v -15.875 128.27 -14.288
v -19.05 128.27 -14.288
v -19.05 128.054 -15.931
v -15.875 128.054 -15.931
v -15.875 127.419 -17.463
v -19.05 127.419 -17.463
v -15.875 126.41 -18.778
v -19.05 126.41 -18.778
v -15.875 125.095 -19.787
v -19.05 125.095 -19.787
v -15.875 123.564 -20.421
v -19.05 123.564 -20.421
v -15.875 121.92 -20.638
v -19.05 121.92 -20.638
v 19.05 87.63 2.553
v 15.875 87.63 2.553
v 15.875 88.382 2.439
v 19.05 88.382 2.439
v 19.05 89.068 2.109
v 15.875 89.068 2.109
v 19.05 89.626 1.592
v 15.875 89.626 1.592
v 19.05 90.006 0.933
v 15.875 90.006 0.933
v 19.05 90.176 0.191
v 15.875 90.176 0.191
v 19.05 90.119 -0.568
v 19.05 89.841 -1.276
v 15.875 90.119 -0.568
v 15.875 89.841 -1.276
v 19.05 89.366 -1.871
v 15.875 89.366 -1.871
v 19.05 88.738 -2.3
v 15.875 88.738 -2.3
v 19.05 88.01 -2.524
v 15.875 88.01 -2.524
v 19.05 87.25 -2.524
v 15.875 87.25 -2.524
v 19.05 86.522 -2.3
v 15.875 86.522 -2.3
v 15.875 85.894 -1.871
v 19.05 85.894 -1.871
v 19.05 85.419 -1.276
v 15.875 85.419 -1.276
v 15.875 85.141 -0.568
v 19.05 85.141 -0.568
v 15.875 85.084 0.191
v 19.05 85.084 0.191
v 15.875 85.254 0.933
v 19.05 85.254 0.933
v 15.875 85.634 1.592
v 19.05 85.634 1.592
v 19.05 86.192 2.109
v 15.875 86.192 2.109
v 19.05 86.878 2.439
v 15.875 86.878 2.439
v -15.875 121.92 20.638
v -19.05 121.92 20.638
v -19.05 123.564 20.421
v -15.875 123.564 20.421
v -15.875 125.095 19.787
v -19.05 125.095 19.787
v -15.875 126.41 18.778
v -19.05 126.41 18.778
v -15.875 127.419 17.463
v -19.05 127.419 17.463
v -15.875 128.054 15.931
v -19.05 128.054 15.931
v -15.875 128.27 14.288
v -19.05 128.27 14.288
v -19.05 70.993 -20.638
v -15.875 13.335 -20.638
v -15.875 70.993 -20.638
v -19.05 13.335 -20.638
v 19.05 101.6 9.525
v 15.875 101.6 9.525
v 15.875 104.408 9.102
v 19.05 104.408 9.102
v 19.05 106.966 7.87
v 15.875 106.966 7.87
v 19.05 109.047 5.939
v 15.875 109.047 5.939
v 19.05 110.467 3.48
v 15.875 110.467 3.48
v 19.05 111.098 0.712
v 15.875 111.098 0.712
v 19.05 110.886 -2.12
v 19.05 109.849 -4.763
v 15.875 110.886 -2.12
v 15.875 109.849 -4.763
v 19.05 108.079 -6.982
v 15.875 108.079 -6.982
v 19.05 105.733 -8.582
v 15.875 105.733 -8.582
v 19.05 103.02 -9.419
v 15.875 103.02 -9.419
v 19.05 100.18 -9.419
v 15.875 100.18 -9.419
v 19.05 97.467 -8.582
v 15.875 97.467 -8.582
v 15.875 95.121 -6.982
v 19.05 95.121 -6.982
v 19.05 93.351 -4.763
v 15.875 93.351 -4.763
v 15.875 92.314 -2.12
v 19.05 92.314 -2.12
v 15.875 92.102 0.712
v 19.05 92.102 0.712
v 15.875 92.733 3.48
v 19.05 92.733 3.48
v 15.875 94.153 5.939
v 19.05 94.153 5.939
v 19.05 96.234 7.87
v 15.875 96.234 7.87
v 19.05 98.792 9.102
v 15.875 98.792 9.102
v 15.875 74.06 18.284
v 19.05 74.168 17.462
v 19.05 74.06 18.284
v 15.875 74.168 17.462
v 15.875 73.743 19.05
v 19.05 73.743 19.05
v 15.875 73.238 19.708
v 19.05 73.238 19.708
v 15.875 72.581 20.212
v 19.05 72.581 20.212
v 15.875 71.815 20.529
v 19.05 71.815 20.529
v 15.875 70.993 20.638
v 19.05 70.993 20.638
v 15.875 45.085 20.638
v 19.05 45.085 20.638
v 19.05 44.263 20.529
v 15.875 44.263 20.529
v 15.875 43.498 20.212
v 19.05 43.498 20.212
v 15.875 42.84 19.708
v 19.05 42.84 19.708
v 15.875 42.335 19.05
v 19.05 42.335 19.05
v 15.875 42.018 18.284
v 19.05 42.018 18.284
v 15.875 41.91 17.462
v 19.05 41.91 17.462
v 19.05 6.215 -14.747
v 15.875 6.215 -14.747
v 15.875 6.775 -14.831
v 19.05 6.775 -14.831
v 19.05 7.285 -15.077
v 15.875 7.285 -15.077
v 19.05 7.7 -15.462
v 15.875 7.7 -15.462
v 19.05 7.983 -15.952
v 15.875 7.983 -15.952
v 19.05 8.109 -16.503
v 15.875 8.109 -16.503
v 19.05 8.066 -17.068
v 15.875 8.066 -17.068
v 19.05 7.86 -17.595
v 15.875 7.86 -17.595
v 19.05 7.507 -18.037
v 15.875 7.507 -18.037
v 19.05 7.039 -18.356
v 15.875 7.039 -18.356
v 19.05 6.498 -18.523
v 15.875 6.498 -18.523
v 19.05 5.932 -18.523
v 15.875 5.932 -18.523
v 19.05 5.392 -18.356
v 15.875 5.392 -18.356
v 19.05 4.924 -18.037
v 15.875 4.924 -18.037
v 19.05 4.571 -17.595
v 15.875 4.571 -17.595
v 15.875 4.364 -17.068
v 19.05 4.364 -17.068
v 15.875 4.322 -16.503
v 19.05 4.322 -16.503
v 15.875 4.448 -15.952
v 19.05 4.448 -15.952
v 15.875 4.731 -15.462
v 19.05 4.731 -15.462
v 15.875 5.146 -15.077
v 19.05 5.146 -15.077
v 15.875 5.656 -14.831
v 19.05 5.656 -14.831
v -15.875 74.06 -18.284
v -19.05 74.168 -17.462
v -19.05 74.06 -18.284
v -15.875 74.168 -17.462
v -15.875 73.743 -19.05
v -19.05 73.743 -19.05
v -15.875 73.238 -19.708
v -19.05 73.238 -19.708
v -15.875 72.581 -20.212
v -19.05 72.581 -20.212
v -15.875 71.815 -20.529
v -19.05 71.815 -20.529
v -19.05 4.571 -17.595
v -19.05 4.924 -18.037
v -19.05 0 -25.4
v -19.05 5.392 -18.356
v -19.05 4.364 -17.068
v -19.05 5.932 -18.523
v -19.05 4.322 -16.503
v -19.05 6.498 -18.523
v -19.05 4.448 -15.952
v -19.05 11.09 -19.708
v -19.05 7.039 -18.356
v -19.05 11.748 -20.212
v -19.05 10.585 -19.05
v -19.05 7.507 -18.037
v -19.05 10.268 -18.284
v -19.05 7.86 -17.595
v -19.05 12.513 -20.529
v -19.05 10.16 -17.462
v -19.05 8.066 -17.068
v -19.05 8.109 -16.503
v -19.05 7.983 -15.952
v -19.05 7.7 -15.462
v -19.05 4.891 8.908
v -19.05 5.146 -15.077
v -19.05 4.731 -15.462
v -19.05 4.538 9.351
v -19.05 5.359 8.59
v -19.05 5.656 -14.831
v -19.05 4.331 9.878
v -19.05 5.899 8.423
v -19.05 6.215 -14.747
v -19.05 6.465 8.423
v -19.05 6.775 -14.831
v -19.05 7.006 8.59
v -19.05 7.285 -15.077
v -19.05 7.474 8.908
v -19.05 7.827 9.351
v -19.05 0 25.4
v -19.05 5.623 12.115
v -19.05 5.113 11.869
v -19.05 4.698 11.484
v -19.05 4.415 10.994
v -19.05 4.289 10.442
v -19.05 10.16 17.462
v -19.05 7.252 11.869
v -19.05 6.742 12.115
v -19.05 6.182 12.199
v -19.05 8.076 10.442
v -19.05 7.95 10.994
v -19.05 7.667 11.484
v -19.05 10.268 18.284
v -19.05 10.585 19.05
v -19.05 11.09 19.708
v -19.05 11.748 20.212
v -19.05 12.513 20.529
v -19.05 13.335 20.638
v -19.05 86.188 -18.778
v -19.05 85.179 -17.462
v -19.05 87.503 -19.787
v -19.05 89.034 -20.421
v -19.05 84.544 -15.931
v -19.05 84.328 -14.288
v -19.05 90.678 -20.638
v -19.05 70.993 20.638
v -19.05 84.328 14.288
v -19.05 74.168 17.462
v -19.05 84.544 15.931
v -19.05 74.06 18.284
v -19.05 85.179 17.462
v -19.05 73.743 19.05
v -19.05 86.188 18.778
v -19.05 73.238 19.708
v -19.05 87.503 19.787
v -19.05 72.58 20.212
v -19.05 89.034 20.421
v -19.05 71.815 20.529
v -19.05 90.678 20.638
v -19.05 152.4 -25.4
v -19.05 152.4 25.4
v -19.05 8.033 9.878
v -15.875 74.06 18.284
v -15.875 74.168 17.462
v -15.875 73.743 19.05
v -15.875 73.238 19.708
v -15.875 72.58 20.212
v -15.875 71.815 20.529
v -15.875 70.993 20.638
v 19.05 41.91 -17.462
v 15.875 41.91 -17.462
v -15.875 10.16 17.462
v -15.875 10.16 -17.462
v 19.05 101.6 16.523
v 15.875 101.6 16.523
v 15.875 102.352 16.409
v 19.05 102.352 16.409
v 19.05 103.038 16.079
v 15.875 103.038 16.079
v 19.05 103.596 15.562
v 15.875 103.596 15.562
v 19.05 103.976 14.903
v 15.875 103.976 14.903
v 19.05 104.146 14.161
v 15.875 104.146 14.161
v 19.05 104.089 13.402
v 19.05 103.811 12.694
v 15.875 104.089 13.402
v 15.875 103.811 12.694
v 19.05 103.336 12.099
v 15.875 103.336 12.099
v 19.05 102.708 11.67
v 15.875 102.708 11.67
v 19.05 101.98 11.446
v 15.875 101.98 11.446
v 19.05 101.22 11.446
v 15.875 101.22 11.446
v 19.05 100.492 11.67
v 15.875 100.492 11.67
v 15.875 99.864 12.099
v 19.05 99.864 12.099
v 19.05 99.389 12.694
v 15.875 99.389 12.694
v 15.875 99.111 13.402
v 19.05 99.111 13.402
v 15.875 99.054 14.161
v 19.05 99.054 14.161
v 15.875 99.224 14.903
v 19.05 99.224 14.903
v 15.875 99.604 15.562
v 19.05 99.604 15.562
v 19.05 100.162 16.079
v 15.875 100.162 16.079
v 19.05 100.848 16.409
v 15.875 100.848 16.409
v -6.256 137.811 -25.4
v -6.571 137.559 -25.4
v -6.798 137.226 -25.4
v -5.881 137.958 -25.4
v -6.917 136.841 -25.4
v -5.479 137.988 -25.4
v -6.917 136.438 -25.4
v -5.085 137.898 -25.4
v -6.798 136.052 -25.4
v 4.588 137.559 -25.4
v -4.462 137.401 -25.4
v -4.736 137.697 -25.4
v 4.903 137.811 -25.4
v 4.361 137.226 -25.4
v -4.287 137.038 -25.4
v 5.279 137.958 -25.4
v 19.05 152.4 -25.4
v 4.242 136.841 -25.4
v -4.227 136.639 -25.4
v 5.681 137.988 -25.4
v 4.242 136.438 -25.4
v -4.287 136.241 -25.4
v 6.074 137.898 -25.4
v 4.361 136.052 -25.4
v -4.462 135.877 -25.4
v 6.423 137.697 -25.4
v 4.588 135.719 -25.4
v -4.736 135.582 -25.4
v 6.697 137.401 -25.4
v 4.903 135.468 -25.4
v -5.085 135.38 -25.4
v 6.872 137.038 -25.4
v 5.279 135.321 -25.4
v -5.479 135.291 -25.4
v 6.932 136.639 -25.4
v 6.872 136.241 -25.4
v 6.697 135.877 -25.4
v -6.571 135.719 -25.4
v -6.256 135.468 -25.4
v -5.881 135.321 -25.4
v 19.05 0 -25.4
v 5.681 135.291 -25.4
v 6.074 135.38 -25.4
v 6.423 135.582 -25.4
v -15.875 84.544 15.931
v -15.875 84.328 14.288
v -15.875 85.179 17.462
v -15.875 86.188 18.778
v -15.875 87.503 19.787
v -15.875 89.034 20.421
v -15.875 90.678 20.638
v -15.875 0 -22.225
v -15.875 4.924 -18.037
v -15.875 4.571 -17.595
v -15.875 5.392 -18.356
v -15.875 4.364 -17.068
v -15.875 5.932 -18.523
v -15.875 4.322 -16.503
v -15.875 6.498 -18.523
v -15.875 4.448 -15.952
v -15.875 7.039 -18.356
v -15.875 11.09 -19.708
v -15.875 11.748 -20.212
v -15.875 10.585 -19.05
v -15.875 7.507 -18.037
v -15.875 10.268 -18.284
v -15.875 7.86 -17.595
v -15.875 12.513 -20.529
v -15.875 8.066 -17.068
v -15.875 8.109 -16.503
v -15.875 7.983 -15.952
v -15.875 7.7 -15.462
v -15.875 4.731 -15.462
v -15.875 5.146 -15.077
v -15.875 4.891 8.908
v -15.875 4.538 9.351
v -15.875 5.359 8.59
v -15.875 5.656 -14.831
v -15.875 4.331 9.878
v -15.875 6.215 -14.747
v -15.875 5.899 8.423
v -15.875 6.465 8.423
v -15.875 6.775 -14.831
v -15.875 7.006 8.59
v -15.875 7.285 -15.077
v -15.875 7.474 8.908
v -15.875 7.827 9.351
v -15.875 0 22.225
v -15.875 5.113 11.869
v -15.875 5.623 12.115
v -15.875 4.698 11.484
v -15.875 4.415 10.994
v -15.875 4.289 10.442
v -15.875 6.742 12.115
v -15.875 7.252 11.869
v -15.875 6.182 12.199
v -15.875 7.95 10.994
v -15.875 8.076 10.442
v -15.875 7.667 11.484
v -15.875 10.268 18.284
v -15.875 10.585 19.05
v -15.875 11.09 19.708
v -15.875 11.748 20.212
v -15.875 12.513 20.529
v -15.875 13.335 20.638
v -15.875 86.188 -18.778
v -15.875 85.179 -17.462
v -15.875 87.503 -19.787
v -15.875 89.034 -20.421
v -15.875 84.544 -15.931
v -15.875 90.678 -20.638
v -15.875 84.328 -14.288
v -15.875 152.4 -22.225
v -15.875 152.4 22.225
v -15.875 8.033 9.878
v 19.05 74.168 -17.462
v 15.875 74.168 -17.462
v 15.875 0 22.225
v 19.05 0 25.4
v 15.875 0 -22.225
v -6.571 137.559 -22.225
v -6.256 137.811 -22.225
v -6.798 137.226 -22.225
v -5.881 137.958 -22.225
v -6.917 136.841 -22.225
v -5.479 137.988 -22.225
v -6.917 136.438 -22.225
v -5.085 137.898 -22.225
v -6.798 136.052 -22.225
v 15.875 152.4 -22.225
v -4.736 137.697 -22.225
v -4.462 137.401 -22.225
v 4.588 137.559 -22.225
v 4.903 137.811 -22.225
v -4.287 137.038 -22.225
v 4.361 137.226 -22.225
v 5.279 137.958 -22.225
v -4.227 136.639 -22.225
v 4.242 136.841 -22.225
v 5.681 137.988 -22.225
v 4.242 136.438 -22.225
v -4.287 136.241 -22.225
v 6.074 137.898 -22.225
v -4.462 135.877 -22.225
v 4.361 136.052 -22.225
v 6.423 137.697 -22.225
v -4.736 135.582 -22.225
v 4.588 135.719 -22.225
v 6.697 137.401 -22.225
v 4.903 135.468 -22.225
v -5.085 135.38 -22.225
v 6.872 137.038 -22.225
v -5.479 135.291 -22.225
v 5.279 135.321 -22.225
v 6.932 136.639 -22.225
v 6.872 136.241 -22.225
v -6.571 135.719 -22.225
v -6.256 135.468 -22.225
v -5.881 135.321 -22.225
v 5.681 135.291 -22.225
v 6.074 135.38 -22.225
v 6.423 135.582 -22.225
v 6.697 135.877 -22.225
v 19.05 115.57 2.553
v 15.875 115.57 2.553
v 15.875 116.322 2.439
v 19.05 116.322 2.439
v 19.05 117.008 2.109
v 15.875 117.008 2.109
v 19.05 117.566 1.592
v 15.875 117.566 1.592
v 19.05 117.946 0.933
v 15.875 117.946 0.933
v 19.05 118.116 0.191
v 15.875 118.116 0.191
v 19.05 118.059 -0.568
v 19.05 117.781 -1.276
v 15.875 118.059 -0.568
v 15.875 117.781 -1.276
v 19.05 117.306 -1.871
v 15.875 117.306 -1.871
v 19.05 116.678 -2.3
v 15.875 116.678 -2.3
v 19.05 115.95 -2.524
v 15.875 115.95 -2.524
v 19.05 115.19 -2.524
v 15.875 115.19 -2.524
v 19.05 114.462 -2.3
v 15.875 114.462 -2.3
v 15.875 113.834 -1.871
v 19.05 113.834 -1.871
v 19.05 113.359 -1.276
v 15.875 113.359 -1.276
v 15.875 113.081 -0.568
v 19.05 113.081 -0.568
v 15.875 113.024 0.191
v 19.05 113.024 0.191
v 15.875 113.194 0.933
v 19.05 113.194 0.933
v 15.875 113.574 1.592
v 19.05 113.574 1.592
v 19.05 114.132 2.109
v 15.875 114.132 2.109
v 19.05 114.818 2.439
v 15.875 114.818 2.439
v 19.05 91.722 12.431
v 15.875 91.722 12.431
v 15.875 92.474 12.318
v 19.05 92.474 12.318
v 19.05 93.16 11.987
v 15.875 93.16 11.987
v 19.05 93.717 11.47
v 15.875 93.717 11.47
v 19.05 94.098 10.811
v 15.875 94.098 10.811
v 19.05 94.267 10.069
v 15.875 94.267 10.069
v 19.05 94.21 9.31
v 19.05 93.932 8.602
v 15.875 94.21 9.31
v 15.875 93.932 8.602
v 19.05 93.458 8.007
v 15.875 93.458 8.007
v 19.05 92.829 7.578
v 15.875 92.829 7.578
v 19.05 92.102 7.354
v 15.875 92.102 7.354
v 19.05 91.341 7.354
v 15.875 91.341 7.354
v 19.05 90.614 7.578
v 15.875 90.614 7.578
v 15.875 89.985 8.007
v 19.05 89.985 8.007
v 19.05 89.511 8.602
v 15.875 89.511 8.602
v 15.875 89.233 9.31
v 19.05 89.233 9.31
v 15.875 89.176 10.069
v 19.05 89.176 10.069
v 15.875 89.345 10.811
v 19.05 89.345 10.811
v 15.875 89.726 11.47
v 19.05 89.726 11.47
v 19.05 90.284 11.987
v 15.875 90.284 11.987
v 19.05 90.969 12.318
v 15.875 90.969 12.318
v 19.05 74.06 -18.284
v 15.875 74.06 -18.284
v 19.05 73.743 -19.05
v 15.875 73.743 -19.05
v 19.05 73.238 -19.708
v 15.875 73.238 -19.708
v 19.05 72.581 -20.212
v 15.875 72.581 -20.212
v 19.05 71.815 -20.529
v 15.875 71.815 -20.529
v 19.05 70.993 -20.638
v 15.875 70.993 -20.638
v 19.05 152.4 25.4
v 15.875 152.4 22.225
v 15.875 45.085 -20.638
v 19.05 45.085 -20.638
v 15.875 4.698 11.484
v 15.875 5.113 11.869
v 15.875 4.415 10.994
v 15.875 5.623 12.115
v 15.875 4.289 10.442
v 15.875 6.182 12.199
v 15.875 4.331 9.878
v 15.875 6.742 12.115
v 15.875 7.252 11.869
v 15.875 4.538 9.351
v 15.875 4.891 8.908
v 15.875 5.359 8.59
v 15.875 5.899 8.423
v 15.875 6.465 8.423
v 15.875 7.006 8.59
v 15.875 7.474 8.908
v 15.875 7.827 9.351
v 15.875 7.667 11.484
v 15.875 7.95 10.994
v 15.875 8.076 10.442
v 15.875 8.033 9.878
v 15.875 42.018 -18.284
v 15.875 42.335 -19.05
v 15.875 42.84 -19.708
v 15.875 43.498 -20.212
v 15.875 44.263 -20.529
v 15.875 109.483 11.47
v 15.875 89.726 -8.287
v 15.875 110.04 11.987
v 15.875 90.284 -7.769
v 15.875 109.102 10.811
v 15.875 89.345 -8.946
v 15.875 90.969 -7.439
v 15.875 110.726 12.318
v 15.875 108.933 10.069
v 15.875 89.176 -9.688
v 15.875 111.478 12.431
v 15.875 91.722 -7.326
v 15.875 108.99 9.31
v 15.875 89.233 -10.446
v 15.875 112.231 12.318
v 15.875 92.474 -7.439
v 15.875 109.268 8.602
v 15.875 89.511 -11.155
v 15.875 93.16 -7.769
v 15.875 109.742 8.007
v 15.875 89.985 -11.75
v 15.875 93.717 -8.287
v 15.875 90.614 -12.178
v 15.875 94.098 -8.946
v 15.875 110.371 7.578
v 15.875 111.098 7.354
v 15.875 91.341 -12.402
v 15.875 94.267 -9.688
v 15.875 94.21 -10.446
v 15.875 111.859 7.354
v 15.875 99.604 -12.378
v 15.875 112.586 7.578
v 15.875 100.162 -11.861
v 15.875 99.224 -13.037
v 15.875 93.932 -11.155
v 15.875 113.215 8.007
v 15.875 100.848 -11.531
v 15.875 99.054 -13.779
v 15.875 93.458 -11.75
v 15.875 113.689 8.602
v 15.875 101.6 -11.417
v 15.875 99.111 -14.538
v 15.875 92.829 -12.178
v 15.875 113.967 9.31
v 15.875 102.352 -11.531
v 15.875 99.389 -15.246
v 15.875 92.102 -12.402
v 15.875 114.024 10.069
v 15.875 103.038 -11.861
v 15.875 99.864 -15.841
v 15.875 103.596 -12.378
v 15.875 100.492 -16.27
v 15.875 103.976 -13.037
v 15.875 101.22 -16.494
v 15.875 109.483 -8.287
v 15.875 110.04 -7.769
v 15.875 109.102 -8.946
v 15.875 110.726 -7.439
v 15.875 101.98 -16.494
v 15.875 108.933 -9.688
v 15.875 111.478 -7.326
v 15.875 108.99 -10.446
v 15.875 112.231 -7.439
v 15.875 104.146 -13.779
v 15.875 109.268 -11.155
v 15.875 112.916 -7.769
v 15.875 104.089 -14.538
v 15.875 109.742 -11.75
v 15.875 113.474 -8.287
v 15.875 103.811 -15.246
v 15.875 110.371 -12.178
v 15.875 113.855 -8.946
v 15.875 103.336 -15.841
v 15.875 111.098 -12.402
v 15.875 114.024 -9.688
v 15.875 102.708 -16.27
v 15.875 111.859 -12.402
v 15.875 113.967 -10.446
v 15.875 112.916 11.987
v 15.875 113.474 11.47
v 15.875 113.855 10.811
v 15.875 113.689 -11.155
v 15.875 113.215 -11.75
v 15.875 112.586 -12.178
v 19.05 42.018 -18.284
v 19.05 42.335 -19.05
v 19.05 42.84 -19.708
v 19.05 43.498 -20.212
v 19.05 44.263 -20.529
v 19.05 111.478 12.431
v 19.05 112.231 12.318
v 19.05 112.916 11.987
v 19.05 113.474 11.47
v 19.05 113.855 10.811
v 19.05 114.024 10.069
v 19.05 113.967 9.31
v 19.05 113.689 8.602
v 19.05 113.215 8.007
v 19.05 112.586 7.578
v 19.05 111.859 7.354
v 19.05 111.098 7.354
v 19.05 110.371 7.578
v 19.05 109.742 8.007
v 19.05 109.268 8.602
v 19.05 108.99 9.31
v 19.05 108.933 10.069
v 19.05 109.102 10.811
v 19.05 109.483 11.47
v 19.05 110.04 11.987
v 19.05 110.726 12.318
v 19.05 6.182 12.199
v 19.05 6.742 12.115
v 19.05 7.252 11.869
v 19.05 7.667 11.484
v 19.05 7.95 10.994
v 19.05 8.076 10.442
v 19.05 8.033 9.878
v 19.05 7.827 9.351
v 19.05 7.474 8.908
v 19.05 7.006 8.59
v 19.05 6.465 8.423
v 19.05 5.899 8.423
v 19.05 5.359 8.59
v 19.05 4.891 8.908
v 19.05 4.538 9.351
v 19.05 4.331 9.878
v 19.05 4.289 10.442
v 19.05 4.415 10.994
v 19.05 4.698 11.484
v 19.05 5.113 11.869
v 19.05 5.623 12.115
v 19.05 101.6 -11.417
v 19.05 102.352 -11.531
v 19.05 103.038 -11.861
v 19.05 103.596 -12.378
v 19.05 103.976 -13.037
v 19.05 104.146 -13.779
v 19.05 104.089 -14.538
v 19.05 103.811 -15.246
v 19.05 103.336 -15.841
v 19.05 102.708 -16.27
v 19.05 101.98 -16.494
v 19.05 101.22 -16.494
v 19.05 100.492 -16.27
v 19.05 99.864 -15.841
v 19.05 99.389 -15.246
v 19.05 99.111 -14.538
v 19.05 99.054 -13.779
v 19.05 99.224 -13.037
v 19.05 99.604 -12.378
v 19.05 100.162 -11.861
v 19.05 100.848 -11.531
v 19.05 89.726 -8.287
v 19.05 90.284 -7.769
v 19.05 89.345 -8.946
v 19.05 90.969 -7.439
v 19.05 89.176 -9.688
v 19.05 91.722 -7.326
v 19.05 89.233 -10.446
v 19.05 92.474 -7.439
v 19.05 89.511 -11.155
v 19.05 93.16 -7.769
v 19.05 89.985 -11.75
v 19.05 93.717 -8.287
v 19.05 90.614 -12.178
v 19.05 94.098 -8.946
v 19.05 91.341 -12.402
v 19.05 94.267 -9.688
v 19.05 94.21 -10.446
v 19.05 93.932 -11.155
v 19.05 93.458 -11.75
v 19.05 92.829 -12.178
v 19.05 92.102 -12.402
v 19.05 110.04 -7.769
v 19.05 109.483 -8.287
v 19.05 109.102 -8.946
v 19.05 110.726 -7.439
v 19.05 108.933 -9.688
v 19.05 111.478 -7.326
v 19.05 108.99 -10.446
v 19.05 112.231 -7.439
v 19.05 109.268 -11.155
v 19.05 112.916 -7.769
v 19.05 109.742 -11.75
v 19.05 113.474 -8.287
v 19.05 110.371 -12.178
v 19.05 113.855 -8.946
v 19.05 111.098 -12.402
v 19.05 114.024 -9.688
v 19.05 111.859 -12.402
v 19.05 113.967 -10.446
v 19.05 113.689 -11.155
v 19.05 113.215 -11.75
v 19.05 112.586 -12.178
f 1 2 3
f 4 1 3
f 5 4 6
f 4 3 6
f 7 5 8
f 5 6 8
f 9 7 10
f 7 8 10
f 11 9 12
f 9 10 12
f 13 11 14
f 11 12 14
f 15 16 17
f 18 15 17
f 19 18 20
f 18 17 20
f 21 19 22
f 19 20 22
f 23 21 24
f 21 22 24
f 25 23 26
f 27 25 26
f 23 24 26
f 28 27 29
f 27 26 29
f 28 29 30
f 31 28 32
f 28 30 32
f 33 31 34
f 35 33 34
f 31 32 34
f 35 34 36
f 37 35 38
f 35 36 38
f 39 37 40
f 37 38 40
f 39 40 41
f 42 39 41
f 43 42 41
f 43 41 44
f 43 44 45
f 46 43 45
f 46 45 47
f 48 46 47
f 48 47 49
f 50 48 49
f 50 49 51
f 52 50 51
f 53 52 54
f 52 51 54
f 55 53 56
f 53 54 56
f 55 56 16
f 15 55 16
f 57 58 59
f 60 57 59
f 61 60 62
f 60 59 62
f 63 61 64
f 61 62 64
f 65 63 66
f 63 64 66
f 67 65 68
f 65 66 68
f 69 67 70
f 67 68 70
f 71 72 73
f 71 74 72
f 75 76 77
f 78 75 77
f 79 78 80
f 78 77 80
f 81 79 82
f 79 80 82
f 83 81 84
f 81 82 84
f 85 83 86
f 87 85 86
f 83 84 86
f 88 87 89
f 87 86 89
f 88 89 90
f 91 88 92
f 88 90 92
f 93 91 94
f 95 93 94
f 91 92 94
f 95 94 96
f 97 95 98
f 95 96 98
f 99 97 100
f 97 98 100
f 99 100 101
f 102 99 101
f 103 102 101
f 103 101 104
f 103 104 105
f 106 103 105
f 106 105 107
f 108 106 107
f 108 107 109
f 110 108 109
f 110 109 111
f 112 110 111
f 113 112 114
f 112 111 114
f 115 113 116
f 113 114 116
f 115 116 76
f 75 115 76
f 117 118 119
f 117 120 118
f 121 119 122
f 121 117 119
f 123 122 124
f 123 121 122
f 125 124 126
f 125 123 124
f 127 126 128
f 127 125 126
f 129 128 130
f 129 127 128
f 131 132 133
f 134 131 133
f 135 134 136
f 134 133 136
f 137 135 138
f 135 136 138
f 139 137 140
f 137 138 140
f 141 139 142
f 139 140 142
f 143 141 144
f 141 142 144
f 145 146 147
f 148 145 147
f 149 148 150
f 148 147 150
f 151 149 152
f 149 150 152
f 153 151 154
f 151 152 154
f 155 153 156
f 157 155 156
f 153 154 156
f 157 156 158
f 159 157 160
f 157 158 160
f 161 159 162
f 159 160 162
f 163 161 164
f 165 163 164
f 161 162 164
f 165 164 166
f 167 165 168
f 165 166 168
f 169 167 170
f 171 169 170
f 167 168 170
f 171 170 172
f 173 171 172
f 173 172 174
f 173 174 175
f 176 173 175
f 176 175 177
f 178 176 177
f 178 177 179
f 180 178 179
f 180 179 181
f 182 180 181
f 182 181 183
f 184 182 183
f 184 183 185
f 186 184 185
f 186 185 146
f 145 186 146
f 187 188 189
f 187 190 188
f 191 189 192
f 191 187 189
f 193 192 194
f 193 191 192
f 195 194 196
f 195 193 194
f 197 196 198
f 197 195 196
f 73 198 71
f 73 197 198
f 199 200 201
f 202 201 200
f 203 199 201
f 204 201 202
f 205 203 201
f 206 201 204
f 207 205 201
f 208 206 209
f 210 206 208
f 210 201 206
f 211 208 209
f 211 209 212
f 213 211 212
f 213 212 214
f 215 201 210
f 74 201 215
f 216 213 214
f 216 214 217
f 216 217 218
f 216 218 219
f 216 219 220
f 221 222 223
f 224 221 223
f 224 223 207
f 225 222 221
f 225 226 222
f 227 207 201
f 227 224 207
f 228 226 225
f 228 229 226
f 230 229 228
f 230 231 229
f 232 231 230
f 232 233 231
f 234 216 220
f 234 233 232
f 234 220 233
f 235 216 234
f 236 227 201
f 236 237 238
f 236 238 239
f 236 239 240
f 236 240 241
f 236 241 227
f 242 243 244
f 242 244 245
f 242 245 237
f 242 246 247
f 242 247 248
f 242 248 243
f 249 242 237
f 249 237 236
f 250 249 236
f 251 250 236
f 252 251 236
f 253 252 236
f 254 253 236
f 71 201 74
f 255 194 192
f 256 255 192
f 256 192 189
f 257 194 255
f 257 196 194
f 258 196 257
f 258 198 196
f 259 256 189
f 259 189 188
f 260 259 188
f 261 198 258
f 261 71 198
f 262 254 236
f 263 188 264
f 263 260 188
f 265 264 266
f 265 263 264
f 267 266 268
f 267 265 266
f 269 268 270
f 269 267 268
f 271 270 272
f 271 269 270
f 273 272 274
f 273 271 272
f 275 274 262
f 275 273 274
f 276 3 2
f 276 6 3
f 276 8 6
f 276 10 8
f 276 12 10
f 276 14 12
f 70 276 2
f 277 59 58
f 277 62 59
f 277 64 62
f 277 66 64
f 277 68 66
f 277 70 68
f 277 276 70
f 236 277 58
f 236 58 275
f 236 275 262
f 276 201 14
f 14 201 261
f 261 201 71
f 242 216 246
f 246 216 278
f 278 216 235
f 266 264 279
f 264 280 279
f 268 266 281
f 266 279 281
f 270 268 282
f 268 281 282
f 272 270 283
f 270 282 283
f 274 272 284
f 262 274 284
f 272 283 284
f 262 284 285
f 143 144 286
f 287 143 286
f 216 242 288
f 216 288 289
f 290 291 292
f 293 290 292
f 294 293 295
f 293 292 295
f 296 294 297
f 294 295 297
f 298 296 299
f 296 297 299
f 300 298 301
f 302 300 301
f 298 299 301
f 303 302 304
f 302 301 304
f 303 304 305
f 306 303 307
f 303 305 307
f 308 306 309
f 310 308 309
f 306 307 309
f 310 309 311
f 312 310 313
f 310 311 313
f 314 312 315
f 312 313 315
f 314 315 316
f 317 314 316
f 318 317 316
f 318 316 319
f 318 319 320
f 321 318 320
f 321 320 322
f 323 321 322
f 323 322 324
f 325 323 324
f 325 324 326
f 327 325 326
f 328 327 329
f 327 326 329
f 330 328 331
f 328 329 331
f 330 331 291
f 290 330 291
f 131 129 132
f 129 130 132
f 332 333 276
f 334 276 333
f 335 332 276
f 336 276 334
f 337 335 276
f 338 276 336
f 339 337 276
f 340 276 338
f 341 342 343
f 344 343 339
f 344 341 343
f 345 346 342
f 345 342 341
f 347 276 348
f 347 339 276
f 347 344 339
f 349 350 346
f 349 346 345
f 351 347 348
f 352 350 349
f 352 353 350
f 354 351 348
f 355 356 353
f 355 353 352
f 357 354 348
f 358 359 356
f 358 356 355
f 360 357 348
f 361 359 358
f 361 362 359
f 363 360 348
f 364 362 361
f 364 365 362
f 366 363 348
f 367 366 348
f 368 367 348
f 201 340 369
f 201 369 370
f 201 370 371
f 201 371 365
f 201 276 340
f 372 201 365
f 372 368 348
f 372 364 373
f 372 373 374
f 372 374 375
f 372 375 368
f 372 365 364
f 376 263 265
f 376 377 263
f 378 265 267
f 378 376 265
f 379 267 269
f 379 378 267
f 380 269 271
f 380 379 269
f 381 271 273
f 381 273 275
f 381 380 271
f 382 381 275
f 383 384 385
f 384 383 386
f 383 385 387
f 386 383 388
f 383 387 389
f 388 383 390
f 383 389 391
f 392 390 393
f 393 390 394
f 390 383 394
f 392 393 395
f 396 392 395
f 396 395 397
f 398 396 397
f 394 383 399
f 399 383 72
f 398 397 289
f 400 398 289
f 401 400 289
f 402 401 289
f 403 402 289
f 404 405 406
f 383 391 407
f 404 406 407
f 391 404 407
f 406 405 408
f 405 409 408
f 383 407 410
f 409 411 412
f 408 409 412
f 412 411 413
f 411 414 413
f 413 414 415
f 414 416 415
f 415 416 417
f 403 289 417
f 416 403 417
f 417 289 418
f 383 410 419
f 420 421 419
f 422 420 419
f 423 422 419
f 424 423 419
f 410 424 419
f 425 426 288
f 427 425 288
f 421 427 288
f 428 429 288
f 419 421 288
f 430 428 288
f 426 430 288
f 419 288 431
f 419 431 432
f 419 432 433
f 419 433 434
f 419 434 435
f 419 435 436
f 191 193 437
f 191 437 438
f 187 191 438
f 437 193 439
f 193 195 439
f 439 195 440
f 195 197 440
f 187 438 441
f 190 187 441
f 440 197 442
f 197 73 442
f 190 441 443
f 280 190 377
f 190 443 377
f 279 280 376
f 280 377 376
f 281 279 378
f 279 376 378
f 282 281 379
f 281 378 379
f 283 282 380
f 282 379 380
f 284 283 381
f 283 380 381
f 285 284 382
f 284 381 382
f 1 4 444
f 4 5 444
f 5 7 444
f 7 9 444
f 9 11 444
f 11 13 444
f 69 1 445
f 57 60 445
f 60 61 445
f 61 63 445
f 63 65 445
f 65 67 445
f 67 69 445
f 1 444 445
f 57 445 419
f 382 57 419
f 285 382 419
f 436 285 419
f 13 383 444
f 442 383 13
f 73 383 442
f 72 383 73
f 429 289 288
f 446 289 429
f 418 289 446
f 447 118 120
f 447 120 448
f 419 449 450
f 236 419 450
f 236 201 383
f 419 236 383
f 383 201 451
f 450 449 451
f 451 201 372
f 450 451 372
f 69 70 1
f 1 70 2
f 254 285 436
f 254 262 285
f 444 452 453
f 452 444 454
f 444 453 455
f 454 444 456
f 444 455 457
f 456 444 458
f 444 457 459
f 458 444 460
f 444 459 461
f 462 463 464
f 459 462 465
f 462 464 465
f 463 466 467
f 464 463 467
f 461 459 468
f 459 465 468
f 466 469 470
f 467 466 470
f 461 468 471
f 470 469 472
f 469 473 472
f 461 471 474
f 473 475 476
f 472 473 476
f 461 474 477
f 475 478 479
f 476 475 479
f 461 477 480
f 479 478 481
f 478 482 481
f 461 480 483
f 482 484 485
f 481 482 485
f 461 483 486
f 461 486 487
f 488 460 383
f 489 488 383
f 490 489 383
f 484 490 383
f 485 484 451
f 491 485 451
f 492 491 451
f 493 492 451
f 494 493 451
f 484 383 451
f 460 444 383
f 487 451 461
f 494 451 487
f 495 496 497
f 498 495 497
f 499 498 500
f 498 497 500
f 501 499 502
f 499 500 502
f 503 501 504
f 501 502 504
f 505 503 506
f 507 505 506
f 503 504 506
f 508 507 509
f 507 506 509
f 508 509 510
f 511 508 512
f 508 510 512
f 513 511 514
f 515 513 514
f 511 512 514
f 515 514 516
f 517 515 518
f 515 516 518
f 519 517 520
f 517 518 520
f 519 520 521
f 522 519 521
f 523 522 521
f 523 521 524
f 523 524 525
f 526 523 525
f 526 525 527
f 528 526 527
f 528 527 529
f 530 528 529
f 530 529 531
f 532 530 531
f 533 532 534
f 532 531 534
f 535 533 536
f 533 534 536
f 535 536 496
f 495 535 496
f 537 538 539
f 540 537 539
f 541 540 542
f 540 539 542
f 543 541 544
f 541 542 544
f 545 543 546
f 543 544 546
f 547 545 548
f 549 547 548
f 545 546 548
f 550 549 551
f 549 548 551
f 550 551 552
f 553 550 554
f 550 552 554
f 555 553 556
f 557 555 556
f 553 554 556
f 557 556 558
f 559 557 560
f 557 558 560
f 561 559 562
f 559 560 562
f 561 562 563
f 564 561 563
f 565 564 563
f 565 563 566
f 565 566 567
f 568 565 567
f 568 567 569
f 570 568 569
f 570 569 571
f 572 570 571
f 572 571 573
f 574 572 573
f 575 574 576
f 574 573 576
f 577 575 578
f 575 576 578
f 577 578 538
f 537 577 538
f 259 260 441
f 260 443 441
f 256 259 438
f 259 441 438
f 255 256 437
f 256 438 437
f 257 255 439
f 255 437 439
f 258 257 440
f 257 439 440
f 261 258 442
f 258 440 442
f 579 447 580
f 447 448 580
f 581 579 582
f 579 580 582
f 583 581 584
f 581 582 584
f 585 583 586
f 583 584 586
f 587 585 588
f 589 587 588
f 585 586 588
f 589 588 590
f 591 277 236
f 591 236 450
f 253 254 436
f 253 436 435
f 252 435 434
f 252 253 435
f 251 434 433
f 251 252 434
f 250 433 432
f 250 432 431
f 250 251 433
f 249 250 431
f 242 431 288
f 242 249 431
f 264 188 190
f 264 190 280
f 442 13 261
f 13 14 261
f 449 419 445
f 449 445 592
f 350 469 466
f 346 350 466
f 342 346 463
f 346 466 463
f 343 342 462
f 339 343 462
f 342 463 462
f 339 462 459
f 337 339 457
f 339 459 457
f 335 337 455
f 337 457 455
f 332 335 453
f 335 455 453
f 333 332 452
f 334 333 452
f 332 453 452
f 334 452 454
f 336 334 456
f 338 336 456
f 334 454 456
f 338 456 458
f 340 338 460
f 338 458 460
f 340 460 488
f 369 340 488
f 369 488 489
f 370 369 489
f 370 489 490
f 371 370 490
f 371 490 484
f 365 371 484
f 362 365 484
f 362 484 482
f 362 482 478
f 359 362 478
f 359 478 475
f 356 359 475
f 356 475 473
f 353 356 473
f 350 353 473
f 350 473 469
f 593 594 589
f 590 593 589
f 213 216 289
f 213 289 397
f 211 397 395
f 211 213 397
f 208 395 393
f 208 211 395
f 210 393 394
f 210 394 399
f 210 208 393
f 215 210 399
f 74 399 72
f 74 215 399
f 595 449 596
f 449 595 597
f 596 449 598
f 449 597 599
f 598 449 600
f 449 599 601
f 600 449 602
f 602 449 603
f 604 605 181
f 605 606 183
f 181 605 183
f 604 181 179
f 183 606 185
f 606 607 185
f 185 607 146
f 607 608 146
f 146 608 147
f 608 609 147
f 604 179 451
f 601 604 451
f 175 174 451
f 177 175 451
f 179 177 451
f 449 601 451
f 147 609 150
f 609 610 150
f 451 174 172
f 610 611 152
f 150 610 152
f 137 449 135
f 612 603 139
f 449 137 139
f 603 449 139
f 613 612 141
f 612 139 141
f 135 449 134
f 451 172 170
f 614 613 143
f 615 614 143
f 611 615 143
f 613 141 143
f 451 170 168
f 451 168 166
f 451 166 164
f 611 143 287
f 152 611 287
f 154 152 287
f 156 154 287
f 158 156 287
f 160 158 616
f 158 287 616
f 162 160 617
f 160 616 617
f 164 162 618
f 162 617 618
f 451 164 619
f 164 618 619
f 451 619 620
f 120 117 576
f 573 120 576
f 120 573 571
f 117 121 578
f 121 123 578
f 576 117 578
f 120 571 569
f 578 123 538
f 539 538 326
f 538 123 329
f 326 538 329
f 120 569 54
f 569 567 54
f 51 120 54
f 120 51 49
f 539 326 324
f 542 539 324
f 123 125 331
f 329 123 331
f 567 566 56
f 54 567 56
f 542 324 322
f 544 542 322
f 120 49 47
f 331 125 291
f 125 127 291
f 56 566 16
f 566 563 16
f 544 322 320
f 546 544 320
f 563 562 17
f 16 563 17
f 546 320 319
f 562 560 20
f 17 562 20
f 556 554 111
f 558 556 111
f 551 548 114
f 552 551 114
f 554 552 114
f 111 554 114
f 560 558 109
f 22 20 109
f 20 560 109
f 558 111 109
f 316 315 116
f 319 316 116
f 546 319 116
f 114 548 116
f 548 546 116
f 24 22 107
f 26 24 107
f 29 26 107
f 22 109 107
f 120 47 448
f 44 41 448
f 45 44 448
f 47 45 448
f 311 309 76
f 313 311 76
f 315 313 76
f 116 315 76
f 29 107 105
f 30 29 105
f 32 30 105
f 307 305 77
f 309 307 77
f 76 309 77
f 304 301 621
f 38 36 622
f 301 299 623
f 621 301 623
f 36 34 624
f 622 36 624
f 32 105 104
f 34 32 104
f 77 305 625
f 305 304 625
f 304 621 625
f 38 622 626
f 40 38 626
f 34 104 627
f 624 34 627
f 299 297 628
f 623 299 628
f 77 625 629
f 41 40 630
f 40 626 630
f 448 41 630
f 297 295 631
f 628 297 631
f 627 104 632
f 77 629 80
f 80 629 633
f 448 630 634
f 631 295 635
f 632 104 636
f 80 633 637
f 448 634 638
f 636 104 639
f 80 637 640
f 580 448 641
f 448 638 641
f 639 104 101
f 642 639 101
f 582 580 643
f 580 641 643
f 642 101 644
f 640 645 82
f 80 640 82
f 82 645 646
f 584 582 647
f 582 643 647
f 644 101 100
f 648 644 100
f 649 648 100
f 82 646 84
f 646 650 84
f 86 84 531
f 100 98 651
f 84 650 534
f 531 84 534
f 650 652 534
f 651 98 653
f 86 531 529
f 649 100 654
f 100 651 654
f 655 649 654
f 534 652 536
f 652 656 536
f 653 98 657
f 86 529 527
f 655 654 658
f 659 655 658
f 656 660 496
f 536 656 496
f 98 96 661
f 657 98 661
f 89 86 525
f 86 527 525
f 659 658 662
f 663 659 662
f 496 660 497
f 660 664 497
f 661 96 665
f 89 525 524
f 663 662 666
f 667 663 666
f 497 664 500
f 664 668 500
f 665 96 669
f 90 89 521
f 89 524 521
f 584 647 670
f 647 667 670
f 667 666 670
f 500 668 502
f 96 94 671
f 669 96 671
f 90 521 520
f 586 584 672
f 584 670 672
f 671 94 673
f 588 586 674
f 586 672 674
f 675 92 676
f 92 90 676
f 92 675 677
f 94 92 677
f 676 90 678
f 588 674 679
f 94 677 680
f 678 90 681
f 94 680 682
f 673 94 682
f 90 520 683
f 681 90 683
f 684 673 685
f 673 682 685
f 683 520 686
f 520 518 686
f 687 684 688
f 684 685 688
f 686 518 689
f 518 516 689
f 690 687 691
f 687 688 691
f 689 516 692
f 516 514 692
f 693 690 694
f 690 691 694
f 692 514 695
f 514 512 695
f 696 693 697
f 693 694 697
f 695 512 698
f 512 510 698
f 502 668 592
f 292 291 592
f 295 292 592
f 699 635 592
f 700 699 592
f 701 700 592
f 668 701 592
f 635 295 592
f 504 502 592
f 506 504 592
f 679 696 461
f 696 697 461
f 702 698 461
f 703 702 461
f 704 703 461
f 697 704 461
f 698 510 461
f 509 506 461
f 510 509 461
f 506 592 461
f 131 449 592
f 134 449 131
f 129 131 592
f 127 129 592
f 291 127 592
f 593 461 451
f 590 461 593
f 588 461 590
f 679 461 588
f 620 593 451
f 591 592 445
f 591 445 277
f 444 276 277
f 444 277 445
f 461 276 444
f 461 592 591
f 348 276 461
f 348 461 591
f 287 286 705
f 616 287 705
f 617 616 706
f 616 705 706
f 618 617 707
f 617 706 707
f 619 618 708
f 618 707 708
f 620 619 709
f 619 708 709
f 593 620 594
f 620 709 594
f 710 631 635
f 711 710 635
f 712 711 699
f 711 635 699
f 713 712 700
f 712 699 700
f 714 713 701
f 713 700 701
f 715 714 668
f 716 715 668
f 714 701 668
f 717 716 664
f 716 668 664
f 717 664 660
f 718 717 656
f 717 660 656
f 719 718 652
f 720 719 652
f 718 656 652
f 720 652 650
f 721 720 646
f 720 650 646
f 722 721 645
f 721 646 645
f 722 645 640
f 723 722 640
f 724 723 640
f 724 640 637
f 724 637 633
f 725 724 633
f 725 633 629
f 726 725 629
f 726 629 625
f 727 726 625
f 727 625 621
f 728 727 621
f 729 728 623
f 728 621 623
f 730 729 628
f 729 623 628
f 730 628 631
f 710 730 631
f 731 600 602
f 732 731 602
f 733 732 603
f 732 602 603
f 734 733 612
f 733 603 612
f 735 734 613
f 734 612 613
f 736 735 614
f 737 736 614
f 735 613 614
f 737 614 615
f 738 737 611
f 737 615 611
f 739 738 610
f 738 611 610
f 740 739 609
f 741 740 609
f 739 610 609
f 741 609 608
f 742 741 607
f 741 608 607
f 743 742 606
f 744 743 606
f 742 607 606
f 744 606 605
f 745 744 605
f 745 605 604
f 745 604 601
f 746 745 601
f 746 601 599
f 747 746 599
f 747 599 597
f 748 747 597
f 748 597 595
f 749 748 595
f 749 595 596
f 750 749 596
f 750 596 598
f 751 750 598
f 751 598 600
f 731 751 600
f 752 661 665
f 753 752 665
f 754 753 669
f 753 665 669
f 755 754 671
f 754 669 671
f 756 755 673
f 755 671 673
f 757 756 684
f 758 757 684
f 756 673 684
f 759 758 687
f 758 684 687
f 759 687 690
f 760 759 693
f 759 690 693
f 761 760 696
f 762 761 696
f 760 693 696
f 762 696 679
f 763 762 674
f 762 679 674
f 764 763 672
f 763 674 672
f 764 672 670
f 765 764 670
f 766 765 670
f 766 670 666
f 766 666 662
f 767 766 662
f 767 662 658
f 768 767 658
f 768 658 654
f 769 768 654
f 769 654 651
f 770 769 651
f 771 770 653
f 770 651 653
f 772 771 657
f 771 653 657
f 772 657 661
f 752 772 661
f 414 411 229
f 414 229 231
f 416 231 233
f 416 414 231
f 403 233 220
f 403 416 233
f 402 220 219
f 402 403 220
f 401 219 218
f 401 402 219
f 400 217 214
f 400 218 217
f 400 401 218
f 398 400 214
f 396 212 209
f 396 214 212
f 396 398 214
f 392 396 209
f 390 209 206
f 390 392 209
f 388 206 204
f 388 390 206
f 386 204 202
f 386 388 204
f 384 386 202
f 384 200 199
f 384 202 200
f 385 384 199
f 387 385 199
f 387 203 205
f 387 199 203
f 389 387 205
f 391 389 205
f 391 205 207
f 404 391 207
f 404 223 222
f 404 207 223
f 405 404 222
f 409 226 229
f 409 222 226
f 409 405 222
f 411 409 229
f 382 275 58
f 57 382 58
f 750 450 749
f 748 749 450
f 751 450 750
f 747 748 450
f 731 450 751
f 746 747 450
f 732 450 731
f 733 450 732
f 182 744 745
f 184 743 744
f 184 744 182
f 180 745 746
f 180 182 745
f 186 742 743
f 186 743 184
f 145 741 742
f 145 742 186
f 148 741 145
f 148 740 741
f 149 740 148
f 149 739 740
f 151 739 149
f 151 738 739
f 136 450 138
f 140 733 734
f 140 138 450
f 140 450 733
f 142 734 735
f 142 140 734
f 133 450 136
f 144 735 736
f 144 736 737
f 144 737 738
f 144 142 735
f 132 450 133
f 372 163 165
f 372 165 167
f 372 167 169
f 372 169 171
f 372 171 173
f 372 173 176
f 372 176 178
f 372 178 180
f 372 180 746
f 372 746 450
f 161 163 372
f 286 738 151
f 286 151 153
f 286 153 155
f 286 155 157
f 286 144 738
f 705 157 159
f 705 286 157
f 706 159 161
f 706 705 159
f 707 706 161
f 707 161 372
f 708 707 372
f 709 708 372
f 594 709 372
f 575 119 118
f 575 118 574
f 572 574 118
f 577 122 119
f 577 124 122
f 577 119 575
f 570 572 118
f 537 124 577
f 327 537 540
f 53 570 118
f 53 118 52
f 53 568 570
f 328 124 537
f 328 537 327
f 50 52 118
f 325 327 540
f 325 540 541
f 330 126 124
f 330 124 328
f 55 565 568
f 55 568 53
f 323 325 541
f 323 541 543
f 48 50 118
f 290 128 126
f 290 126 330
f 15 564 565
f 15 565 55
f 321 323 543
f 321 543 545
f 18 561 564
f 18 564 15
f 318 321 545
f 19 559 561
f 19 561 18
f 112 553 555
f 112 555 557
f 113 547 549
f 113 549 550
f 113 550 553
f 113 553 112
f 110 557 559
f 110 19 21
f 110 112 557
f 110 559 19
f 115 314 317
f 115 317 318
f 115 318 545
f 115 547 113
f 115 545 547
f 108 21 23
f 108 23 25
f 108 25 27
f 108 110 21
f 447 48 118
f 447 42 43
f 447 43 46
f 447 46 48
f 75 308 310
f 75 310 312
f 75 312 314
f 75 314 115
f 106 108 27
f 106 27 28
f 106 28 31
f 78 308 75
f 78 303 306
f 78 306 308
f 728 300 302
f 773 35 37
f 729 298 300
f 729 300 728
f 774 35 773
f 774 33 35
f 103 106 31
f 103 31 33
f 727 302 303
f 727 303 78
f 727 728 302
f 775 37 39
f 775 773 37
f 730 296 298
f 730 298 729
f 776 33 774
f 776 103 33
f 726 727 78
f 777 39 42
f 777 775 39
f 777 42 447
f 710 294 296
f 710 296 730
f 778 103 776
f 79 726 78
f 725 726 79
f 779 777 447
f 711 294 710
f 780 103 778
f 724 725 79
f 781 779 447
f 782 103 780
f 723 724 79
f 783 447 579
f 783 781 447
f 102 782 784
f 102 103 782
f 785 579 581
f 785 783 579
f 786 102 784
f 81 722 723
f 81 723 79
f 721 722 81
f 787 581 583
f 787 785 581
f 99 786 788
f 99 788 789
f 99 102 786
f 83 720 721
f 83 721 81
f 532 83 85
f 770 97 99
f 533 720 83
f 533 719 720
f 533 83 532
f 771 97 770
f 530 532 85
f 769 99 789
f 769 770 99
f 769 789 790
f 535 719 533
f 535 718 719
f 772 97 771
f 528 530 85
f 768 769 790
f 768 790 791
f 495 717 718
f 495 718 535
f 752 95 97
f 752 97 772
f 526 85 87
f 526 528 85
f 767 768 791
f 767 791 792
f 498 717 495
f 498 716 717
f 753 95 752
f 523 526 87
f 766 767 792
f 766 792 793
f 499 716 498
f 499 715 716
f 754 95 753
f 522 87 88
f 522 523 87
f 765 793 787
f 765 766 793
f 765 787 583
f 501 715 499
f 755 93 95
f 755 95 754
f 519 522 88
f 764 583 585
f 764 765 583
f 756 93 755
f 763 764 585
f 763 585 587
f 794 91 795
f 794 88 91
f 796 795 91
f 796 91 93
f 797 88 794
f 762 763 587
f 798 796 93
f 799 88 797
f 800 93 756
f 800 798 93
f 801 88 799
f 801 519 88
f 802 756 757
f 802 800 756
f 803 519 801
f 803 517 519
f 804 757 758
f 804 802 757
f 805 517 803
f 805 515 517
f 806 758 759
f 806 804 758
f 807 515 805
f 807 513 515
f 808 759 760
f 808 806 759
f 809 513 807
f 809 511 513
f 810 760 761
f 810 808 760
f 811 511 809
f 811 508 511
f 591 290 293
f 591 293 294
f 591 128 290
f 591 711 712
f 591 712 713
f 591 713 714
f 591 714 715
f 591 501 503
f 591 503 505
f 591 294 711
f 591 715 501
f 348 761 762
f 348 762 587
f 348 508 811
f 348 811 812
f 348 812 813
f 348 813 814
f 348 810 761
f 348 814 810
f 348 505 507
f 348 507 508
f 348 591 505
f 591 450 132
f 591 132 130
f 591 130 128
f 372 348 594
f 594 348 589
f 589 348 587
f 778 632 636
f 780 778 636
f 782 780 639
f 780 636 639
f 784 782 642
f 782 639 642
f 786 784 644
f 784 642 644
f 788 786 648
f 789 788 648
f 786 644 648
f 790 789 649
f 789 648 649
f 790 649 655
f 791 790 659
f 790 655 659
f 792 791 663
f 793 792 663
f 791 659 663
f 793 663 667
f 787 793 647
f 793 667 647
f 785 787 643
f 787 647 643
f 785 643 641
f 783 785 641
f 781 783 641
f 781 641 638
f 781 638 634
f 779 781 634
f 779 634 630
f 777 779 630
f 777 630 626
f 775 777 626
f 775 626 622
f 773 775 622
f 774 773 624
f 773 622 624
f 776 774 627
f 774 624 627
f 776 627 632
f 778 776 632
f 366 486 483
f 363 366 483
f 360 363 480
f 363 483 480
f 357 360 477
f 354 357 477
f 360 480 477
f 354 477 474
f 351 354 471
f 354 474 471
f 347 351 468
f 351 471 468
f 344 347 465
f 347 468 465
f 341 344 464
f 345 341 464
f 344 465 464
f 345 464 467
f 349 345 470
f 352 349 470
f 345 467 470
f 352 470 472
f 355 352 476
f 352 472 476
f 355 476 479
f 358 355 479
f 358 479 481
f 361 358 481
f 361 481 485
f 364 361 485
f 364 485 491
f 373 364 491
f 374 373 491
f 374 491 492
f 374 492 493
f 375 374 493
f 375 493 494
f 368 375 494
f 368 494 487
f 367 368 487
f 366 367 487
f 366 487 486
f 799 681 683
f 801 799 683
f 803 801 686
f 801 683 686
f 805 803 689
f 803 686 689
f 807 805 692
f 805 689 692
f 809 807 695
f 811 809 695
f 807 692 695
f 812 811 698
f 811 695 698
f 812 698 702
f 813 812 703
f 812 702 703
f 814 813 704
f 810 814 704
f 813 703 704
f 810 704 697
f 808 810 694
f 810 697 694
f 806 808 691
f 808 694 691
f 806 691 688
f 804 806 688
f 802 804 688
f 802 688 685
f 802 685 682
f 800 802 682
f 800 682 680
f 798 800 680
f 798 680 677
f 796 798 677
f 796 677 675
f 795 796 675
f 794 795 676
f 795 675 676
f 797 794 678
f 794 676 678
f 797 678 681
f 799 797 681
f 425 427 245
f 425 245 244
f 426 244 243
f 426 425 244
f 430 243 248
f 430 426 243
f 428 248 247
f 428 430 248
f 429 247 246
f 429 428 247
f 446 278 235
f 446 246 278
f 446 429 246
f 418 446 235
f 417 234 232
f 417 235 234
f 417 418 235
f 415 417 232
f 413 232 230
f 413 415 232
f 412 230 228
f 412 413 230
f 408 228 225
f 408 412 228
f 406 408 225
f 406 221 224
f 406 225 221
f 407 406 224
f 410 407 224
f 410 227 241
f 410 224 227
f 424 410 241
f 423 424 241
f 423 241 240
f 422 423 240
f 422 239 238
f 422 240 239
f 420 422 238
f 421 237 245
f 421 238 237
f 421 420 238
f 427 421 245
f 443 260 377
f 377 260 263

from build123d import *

# Parameters (mm, degrees)
SKETCH1_W                      = 38.1
SKETCH1_H                      = 50.8
SKETCH1_W_2                    = 31.75
SKETCH1_H_2                    = 44.45
BOSS_EXTRUDE1_DEPTH            = 152.4
SKETCH2_R                      = 1.89865
CUT_EXTRUDE1_DEPTH             = 35.925
CUT_EXTRUDE1_DEPTH_BACK        = 4.175
CUT_EXTRUDE3_DEPTH             = 3.175
CUT_EXTRUDE4_DEPTH             = 3.175
SKETCH6_R                      = 9.525
SKETCH6_R_2                    = 2.5527
CUT_EXTRUDE5_DEPTH             = 3.175
CUT_EXTRUDE6_DEPTH             = 3.175
F_6_32_TAPPED_HOLE2_D          = 2.7051
F_6_32_TAPPED_HOLE2_DEPTH      = 3.175
CUT_EXTRUDE7_REACH             = 40.1
CUT_EXTRUDE7_DIRECTION_2_DEPTH = 1
FILLET1_R                      = 3.175
FILLET2_R                      = 3.175
BOSS_EXTRUDE2_DEPTH            = 3.175
CUT_EXTRUDE8_REACH             = 40.1
FILLET3_R                      = 3.175
FILLET4_R                      = 3.175
FILLET5_R                      = 6.35
FILLET6_R                      = 6.35
BOSS_EXTRUDE3_DEPTH            = 3.175
CUT_EXTRUDE9_REACH             = 40.1
BOSS_EXTRUDE4_DEPTH            = 3.175
FILLET7_R                      = 3.175
FILLET8_R                      = 3.175
FILLET9_R                      = 3.175
FILLET10_R                     = 3.175
FILLET11_R                     = 6.35
FILLET12_R                     = 6.35


with BuildPart() as part:
    # Sketch1 → Boss-Extrude1 (new body)
    with BuildSketch(Plane(origin=(0, 0, 0), x_dir=(1, 0, 0), z_dir=(0, 1, 0))):
        Rectangle(SKETCH1_W, SKETCH1_H)
        Rectangle(SKETCH1_W_2, SKETCH1_H_2, mode=Mode.SUBTRACT)
    extrude(amount=BOSS_EXTRUDE1_DEPTH)

    # Sketch2 → Cut-Extrude1 (cut, two sides)
    with BuildSketch(Plane.ZY.offset(-15.875)) as cut_extrude1_sk:
        with Locations((-16.645384182, 6.21538)):
            Circle(SKETCH2_R)
        with Locations((10.30030417, 6.18241423)):
            Circle(SKETCH2_R)
    extrude(amount=CUT_EXTRUDE1_DEPTH, mode=Mode.SUBTRACT)
    extrude(cut_extrude1_sk.sketch, amount=-CUT_EXTRUDE1_DEPTH_BACK, mode=Mode.SUBTRACT)

    # Sketch4 → Cut-Extrude3 (cut)
    with BuildSketch(Plane.ZY.offset(19.05)):
        with BuildLine():
            Line((17.4625, 10.16), (-17.4625, 10.16))
            ThreePointArc((-17.4625, 10.16), (-19.70756403, 11.08993597), (-20.6375, 13.335))
            Line((-20.6375, 13.335), (-20.6375, 64.135))
            ThreePointArc((-20.6375, 64.135), (-19.70756403, 66.38006403), (-17.4625, 67.31))
            Line((-17.4625, 67.31), (17.4625, 67.31))
            ThreePointArc((17.4625, 67.31), (19.70756403, 66.38006403), (20.6375, 64.135))
            Line((20.6375, 64.135), (20.6375, 13.335))
            ThreePointArc((20.6375, 13.335), (19.70756403, 11.08993597), (17.4625, 10.16))
        make_face()
    extrude(amount=-CUT_EXTRUDE3_DEPTH, mode=Mode.SUBTRACT)

    # Sketch5 → Cut-Extrude4 (cut)
    with BuildSketch(Plane(origin=(19.05, 0, 0), x_dir=(0, 0, -1), z_dir=(1, 0, 0))):
        with BuildLine():
            Line((17.4625, 67.31), (-17.4625, 67.31))
            ThreePointArc((-17.4625, 67.31), (-19.70756403, 66.38006403), (-20.6375, 64.135))
            Line((-20.6375, 64.135), (-20.6375, 45.085))
            ThreePointArc((-20.6375, 45.085), (-19.70756403, 42.83993597), (-17.4625, 41.91))
            Line((-17.4625, 41.91), (17.4625, 41.91))
            ThreePointArc((17.4625, 41.91), (19.70756403, 42.83993597), (20.6375, 45.085))
            Line((20.6375, 45.085), (20.6375, 64.135))
            ThreePointArc((20.6375, 64.135), (19.70756403, 66.38006403), (17.4625, 67.31))
        make_face()
    extrude(amount=-CUT_EXTRUDE4_DEPTH, mode=Mode.SUBTRACT)

    # Sketch6 → Cut-Extrude5 (cut)
    with BuildSketch(Plane.ZY.offset(-15.875)):
        with Locations((0, 101.6)):
            Circle(SKETCH6_R)
        with Locations((0, 87.63)):
            Circle(SKETCH6_R_2)
        with Locations((-9.878281733, 91.721718267)):
            Circle(SKETCH6_R_2)
        with Locations((-13.97, 101.6)):
            Circle(SKETCH6_R_2)
        with Locations((-9.878281733, 111.478281733)):
            Circle(SKETCH6_R_2)
        with Locations((0, 115.57)):
            Circle(SKETCH6_R_2)
        with Locations((9.878281733, 111.478281733)):
            Circle(SKETCH6_R_2)
        with Locations((13.97, 101.6)):
            Circle(SKETCH6_R_2)
        with Locations((9.878281733, 91.721718267)):
            Circle(SKETCH6_R_2)
    extrude(amount=-CUT_EXTRUDE5_DEPTH, mode=Mode.SUBTRACT)

    # Sketch7 → Cut-Extrude6 (cut)
    with BuildSketch(Plane.ZY.offset(19.05)):
        with BuildLine():
            Line((-14.2875, 77.47), (14.2875, 77.47))
            ThreePointArc((14.2875, 77.47), (18.777628061, 79.329871939), (20.6375, 83.82))
            Line((20.6375, 83.82), (20.6375, 121.92))
            ThreePointArc((20.6375, 121.92), (18.777628061, 126.410128061), (14.2875, 128.27))
            Line((14.2875, 128.27), (-14.2875, 128.27))
            ThreePointArc((-14.2875, 128.27), (-18.777628061, 126.410128061), (-20.6375, 121.92))
            Line((-20.6375, 121.92), (-20.6375, 83.82))
            ThreePointArc((-20.6375, 83.82), (-18.777628061, 79.329871939), (-14.2875, 77.47))
        make_face()
    extrude(amount=-CUT_EXTRUDE6_DEPTH, mode=Mode.SUBTRACT)

    # #6-32 Tapped Hole2
    with Locations(Plane(origin=(5.579615818, 136.6393, -25.4), x_dir=(-1, 0, 0), z_dir=(0, 0, -1))):
        with Locations((0, 0), (11.159231636, 0)):
            Hole(F_6_32_TAPPED_HOLE2_D / 2, depth=F_6_32_TAPPED_HOLE2_DEPTH)

    # Sketch13 → Cut-Extrude7 (cut, up to next)
    with BuildSketch(Plane(origin=(19.05, 0, 0), x_dir=(0, 0, -1), z_dir=(1, 0, 0)), mode=Mode.PRIVATE) as cut_extrude7_sk1:
        Polygon((0, 78.486), (20.6375, 78.486), (20.6375, 64.135), (-20.6375, 64.135), (-20.6375, 78.486), align=None)
    cut_extrude7_tool1 = extrude(cut_extrude7_sk1.sketch, amount=-CUT_EXTRUDE7_REACH, mode=Mode.PRIVATE) & part.part
    add(cut_extrude7_tool1.solids().sort_by_distance((19.05, 71.3105, 0))[0], mode=Mode.SUBTRACT)

    # Sketch13 → Cut-Extrude7 direction 2 (cut)
    with BuildSketch(Plane(origin=(19.05, 0, 0), x_dir=(0, 0, -1), z_dir=(1, 0, 0))):
        Polygon((0, 78.486), (20.6375, 78.486), (20.6375, 64.135), (-20.6375, 64.135), (-20.6375, 78.486), align=None)
    extrude(amount=CUT_EXTRUDE7_DIRECTION_2_DEPTH, mode=Mode.SUBTRACT)

    # Fillet1
    fillet1_edges = [part.edges().sort_by_distance(p)[0] for p in [
        (17.4625, 78.486, -20.6375),
    ]]
    fillet(fillet1_edges, radius=FILLET1_R)

    # Fillet2
    fillet2_edges = [part.edges().sort_by_distance(p)[0] for p in [
        (17.4625, 78.486, 20.6375),
    ]]
    fillet(fillet2_edges, radius=FILLET2_R)

    # Sketch15 → Boss-Extrude2 (add)
    with BuildSketch(Plane.ZY.offset(19.05)):
        Polygon((0, 78.486), (-20.6375, 78.486), (-20.6375, 88.646), (0, 88.646), (20.6375, 88.646), (20.6375, 78.486), align=None)
    extrude(amount=-BOSS_EXTRUDE2_DEPTH)

    # Sketch16 → Cut-Extrude8 (cut, up to next)
    with BuildSketch(Plane.ZY.offset(19.05), mode=Mode.PRIVATE) as cut_extrude8_sk1:
        Polygon((0, 78.486), (20.6375, 78.486), (20.6375, 64.135), (-20.6375, 64.135), (-20.6375, 78.486), align=None)
    cut_extrude8_tool1 = extrude(cut_extrude8_sk1.sketch, amount=-CUT_EXTRUDE8_REACH, mode=Mode.PRIVATE) & part.part
    add(cut_extrude8_tool1.solids().sort_by_distance((-19.05, 71.3105, 0))[0], mode=Mode.SUBTRACT)

    # Fillet3
    fillet3_edges = [part.edges().sort_by_distance(p)[0] for p in [
        (-17.4625, 78.486, 20.6375),
    ]]
    fillet(fillet3_edges, radius=FILLET3_R)

    # Fillet4
    fillet4_edges = [part.edges().sort_by_distance(p)[0] for p in [
        (-17.4625, 78.486, -20.6375),
    ]]
    fillet(fillet4_edges, radius=FILLET4_R)

    # Fillet5
    fillet5_edges = [part.edges().sort_by_distance(p)[0] for p in [
        (-17.4625, 88.646, -20.6375),
    ]]
    fillet(fillet5_edges, radius=FILLET5_R)

    # Fillet6
    fillet6_edges = [part.edges().sort_by_distance(p)[0] for p in [
        (-17.4625, 88.646, 20.6375),
    ]]
    fillet(fillet6_edges, radius=FILLET6_R)

    # Sketch17 → Boss-Extrude3 (add)
    with BuildSketch(Plane.ZY.offset(19.05)):
        Polygon((0, 74.168), (20.6375, 74.168), (20.6375, 84.35471455), (-20.6375, 84.35471455), (-20.6375, 74.168), align=None)
    extrude(amount=-BOSS_EXTRUDE3_DEPTH)

    # Sketch18 → Cut-Extrude9 (cut, up to next)
    with BuildSketch(Plane.ZY.offset(19.05), mode=Mode.PRIVATE) as cut_extrude9_sk1:
        Polygon((0, 84.328), (-20.6375, 84.328), (-20.6375, 94.996), (20.6375, 94.996), (20.6375, 84.328), align=None)
    cut_extrude9_tool1 = extrude(cut_extrude9_sk1.sketch, amount=-CUT_EXTRUDE9_REACH, mode=Mode.PRIVATE) & part.part
    add(cut_extrude9_tool1.solids().sort_by_distance((-19.05, 89.662, 0))[0], mode=Mode.SUBTRACT)

    # Sketch19 → Boss-Extrude4 (add)
    with BuildSketch(Plane(origin=(19.05, 0, 0), x_dir=(0, 0, -1), z_dir=(1, 0, 0))):
        Polygon((0, 74.168), (20.6375, 74.168), (20.6375, 78.486), (-20.6375, 78.486), (-20.6375, 74.168), align=None)
    extrude(amount=-BOSS_EXTRUDE4_DEPTH)

    # Fillet7
    fillet7_edges = [part.edges().sort_by_distance(p)[0] for p in [
        (17.4625, 74.168, -20.6375),
    ]]
    fillet(fillet7_edges, radius=FILLET7_R)

    # Fillet8
    fillet8_edges = [part.edges().sort_by_distance(p)[0] for p in [
        (17.4625, 74.168, 20.6375),
    ]]
    fillet(fillet8_edges, radius=FILLET8_R)

    # Fillet9
    fillet9_edges = [part.edges().sort_by_distance(p)[0] for p in [
        (-17.4625, 74.168, 20.6375),
    ]]
    fillet(fillet9_edges, radius=FILLET9_R)

    # Fillet10
    fillet10_edges = [part.edges().sort_by_distance(p)[0] for p in [
        (-17.4625, 74.168, -20.6375),
    ]]
    fillet(fillet10_edges, radius=FILLET10_R)

    # Fillet11
    fillet11_edges = [part.edges().sort_by_distance(p)[0] for p in [
        (-17.4625, 84.328, -20.6375),
    ]]
    fillet(fillet11_edges, radius=FILLET11_R)

    # Fillet12
    fillet12_edges = [part.edges().sort_by_distance(p)[0] for p in [
        (-17.4625, 84.328, 20.6375),
    ]]
    fillet(fillet12_edges, radius=FILLET12_R)


solid = part.part
